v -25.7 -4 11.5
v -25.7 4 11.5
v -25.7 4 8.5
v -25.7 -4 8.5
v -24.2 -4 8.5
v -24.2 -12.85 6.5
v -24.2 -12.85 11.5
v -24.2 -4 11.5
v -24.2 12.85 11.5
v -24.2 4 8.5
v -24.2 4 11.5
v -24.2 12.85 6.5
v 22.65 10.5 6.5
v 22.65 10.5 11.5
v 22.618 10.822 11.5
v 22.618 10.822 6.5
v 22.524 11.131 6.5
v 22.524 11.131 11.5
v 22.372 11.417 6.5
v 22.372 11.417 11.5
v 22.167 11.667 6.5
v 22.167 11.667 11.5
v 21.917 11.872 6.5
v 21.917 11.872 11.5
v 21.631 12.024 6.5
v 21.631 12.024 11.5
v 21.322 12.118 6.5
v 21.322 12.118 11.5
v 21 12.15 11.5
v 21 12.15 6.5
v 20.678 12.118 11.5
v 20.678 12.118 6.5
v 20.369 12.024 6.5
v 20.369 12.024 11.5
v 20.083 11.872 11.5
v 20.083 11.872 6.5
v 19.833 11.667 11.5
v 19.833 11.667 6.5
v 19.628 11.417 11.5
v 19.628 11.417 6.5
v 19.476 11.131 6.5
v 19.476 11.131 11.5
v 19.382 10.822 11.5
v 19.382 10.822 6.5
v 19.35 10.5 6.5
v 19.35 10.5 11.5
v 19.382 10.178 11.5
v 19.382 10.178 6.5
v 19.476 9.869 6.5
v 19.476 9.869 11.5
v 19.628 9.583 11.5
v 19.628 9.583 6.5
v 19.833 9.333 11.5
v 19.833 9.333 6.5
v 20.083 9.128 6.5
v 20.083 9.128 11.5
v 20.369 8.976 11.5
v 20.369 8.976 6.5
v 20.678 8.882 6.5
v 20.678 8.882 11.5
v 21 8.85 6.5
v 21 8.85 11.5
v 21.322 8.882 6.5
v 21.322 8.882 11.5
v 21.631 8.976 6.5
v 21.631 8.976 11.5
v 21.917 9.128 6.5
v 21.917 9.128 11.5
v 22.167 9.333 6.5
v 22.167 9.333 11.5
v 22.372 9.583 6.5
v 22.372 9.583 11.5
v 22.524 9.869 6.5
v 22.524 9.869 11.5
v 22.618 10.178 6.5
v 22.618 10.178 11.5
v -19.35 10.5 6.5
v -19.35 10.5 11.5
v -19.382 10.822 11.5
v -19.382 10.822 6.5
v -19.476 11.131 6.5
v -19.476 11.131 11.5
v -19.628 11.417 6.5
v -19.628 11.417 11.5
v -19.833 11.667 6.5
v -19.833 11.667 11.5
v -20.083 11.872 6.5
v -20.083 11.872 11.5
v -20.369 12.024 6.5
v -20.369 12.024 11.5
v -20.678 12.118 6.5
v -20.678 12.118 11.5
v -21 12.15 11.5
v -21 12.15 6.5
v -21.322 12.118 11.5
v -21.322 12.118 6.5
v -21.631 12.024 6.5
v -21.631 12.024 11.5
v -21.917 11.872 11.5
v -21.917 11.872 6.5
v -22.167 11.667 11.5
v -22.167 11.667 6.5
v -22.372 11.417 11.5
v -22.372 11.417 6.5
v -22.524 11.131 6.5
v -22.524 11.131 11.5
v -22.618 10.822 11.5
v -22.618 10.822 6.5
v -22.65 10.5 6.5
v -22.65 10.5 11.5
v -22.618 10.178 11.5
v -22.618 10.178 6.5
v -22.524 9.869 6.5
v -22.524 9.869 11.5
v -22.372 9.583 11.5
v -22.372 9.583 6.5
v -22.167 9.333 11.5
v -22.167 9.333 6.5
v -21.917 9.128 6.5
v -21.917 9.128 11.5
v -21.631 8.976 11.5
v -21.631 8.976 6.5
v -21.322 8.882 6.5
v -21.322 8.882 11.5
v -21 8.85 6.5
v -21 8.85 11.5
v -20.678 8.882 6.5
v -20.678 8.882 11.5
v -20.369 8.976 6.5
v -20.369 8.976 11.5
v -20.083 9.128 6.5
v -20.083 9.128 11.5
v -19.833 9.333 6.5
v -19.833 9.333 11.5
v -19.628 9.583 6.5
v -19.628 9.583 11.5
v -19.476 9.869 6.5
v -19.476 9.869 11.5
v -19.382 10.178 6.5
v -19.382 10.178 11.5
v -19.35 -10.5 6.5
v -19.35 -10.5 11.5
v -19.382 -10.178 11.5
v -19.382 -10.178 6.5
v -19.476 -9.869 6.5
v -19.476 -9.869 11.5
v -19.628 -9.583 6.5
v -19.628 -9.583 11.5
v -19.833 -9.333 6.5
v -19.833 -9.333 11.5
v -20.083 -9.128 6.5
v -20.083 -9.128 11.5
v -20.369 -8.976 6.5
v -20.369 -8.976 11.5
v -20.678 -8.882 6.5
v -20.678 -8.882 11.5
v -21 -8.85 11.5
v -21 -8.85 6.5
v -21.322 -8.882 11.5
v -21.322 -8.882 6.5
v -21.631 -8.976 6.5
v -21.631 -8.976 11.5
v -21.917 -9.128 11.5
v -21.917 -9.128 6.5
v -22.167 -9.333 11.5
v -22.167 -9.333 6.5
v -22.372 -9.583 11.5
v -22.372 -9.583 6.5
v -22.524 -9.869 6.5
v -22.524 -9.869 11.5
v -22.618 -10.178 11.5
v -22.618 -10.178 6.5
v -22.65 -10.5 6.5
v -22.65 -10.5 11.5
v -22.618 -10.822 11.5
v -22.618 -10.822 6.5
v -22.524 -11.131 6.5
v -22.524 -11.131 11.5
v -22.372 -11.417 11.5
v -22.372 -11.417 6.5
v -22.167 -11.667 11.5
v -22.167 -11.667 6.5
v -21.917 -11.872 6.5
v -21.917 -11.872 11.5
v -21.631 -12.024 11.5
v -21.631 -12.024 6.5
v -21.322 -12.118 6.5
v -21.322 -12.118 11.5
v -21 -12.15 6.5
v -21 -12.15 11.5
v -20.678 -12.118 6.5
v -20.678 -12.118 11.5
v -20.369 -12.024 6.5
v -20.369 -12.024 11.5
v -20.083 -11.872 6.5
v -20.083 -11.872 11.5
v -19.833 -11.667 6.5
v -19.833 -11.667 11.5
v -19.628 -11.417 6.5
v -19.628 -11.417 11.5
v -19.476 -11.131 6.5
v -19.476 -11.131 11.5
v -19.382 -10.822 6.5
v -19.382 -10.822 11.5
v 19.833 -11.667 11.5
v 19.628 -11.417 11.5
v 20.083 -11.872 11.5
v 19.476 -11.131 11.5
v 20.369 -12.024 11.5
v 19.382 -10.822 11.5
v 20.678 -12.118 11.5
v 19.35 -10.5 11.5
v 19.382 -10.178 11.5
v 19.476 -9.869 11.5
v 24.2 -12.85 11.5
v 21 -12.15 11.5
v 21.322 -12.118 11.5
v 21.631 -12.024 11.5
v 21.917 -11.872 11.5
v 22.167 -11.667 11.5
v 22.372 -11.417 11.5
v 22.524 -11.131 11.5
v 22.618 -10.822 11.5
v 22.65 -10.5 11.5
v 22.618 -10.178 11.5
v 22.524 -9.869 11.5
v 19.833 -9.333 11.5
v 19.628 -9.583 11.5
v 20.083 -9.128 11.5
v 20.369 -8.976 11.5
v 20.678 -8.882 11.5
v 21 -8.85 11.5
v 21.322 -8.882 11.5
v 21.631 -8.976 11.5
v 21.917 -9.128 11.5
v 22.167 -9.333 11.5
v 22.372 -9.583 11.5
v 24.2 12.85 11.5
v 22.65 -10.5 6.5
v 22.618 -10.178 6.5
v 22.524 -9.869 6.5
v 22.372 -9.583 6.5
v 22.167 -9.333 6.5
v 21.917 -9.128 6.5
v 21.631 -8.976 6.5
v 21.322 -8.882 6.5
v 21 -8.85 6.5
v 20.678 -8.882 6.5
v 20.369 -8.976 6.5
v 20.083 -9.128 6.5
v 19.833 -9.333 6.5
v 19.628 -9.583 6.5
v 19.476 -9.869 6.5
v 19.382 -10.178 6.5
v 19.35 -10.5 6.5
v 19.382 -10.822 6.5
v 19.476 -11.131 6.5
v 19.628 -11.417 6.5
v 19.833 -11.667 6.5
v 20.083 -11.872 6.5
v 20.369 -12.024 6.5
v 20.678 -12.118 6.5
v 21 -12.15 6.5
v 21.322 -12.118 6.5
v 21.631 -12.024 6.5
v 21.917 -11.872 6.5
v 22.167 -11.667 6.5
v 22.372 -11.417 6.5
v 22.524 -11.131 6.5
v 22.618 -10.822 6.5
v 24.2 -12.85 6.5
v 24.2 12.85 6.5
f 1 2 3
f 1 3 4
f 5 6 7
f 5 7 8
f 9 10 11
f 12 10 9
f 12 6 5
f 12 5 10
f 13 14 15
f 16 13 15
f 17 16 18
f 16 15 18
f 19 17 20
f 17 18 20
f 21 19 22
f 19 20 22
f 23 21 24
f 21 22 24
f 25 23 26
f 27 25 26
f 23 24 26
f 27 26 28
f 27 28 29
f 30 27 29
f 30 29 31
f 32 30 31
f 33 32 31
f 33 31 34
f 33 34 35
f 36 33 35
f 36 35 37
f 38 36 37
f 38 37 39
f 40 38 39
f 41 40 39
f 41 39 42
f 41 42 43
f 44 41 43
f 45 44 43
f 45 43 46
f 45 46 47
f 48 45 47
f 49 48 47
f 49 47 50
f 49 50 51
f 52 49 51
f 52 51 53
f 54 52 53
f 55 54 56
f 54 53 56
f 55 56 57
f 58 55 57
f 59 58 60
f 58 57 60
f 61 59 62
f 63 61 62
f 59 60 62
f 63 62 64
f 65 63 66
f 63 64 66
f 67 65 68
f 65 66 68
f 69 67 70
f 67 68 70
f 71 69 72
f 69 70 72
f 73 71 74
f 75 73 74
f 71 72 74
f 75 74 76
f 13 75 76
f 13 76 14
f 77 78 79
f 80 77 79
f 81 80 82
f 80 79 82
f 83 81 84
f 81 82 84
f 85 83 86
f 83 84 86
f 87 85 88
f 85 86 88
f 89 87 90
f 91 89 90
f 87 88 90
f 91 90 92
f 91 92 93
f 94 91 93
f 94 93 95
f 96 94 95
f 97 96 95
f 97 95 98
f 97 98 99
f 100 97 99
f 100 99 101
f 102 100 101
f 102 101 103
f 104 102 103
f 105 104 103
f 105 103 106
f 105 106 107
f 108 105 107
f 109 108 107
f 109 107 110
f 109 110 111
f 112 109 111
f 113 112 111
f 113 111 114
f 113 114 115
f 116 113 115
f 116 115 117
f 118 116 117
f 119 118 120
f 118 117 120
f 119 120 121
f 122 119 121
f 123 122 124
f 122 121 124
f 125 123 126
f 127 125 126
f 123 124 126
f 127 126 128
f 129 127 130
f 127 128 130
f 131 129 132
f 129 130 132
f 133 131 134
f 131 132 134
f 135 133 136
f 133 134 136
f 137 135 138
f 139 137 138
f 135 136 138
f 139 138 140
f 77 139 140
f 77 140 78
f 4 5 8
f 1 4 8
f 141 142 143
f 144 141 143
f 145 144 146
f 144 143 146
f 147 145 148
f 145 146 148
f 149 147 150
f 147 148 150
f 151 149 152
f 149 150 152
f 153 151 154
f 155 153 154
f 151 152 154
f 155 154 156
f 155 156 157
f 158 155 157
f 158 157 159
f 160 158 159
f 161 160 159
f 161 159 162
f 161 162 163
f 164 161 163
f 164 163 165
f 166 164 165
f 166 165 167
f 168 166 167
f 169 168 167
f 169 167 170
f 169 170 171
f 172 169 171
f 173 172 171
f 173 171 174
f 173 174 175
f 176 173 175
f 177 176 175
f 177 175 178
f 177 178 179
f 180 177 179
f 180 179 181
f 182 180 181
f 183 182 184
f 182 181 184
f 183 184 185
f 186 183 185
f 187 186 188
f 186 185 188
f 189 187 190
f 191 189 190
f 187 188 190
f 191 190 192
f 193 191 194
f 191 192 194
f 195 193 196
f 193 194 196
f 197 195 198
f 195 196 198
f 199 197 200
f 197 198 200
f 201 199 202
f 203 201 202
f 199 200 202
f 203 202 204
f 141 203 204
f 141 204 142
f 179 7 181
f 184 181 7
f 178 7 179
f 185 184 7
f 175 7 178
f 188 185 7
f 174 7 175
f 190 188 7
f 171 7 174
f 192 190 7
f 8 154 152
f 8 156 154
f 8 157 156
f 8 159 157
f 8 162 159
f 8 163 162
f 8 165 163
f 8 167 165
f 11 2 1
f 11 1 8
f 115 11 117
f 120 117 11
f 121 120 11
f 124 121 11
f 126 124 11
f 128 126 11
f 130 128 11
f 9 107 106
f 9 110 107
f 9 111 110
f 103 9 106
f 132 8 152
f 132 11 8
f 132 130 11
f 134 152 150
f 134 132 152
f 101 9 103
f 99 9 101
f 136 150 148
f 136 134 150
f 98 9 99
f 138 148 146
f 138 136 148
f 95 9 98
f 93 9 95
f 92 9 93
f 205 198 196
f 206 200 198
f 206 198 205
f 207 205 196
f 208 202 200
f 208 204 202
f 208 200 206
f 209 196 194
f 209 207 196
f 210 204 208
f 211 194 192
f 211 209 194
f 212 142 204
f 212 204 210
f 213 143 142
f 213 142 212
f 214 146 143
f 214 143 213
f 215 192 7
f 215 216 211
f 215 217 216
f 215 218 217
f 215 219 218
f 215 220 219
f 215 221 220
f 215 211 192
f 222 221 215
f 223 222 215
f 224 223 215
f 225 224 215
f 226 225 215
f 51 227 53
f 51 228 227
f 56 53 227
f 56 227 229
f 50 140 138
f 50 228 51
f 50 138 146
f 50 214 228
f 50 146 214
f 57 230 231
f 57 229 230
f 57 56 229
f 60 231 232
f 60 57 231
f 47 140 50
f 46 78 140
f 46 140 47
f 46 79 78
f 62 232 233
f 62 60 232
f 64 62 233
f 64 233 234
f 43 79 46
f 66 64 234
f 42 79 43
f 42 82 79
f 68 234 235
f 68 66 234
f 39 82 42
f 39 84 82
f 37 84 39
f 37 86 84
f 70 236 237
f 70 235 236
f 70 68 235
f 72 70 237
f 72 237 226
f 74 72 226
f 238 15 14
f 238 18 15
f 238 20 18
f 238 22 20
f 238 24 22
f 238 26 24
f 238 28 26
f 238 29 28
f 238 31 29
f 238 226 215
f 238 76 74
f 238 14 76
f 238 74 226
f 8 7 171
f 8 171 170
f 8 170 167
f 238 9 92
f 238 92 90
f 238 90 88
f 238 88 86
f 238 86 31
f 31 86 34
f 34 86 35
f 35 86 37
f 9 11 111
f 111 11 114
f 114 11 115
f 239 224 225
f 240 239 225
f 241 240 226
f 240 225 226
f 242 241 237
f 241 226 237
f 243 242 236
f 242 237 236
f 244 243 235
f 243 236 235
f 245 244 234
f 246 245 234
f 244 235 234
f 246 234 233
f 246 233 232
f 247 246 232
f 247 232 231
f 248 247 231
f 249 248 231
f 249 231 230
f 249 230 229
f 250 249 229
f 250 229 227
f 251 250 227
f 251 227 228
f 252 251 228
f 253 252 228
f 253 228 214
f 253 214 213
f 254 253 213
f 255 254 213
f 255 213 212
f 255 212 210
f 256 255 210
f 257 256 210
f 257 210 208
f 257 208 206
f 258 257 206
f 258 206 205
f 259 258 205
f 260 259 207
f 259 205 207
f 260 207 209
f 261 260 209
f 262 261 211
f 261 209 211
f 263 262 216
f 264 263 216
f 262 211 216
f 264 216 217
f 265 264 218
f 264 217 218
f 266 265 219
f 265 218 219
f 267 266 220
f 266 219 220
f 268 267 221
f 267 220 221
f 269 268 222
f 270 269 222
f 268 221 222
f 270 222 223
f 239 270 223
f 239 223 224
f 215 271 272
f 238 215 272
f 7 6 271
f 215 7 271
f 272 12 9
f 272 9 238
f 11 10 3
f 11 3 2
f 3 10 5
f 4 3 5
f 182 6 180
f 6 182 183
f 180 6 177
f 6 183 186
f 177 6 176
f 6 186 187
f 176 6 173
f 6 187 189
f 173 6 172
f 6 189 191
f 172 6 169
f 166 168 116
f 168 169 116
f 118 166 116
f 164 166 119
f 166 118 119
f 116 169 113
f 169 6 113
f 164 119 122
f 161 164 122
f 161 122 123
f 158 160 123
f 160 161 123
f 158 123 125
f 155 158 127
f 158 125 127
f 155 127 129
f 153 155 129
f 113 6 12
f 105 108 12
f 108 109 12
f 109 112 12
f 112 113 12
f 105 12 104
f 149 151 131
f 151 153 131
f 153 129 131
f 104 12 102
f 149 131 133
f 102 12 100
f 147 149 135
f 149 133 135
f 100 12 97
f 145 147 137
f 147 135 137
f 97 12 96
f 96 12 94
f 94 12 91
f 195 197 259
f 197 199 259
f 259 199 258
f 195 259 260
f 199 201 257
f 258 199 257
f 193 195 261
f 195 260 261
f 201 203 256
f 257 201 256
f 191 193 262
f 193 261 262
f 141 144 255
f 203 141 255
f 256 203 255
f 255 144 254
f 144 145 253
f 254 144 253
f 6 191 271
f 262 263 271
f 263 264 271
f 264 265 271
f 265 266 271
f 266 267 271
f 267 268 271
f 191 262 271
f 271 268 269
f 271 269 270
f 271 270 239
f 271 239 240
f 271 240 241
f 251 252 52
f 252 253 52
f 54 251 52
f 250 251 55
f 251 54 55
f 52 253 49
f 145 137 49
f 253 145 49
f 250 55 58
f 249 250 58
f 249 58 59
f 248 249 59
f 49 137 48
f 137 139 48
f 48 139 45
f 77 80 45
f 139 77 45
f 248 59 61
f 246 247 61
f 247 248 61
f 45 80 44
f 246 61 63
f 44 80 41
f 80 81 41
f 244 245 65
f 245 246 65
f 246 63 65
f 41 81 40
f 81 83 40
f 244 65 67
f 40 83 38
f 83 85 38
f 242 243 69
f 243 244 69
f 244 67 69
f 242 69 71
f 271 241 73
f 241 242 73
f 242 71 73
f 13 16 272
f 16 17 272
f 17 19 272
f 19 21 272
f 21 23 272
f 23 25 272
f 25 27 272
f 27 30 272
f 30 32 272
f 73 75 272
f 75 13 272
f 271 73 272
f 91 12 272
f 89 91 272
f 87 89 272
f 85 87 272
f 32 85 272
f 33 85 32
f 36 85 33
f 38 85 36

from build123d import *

# Parameters (mm, degrees)
SKETCH_W     = 48.4
SKETCH_H     = 25.7
PAD_DEPTH    = 5
SKETCH001_W  = 8
SKETCH001_H  = 3
PAD001_DEPTH = 1.5
SKETCH002_R  = 1.65
POCKET_DEPTH = 5.001


with BuildPart() as part:
    # Sketch → Pad (new body)
    with BuildSketch(Plane.XY):
        Rectangle(SKETCH_W, SKETCH_H)
    extrude(amount=PAD_DEPTH)

    # Sketch001 (on Face4 of Pad) → Pad001 (join)
    with BuildSketch(Plane(origin=(-24.2, 0, 0), x_dir=(0, -1, 0), z_dir=(-1, 0, 0))):
        with Locations((0, 3.5)):
            Rectangle(SKETCH001_W, SKETCH001_H)
    extrude(amount=PAD001_DEPTH)

    # Sketch002 (on Face5 of Pad001) → Pocket (cut, through all)
    with BuildSketch(Plane.XY.offset(5)):
        with Locations((-21, 10.5)):
            Circle(SKETCH002_R)
        with Locations((-21, -10.5)):
            Circle(SKETCH002_R)
        with Locations((21, 10.5)):
            Circle(SKETCH002_R)
        with Locations((21, -10.5)):
            Circle(SKETCH002_R)
    extrude(amount=-POCKET_DEPTH, mode=Mode.SUBTRACT)


with BuildPart() as part_1:
    # Body placement: moved
    add(part.part.moved(Location((0, 0, 6.5))))


solid = part_1.part
